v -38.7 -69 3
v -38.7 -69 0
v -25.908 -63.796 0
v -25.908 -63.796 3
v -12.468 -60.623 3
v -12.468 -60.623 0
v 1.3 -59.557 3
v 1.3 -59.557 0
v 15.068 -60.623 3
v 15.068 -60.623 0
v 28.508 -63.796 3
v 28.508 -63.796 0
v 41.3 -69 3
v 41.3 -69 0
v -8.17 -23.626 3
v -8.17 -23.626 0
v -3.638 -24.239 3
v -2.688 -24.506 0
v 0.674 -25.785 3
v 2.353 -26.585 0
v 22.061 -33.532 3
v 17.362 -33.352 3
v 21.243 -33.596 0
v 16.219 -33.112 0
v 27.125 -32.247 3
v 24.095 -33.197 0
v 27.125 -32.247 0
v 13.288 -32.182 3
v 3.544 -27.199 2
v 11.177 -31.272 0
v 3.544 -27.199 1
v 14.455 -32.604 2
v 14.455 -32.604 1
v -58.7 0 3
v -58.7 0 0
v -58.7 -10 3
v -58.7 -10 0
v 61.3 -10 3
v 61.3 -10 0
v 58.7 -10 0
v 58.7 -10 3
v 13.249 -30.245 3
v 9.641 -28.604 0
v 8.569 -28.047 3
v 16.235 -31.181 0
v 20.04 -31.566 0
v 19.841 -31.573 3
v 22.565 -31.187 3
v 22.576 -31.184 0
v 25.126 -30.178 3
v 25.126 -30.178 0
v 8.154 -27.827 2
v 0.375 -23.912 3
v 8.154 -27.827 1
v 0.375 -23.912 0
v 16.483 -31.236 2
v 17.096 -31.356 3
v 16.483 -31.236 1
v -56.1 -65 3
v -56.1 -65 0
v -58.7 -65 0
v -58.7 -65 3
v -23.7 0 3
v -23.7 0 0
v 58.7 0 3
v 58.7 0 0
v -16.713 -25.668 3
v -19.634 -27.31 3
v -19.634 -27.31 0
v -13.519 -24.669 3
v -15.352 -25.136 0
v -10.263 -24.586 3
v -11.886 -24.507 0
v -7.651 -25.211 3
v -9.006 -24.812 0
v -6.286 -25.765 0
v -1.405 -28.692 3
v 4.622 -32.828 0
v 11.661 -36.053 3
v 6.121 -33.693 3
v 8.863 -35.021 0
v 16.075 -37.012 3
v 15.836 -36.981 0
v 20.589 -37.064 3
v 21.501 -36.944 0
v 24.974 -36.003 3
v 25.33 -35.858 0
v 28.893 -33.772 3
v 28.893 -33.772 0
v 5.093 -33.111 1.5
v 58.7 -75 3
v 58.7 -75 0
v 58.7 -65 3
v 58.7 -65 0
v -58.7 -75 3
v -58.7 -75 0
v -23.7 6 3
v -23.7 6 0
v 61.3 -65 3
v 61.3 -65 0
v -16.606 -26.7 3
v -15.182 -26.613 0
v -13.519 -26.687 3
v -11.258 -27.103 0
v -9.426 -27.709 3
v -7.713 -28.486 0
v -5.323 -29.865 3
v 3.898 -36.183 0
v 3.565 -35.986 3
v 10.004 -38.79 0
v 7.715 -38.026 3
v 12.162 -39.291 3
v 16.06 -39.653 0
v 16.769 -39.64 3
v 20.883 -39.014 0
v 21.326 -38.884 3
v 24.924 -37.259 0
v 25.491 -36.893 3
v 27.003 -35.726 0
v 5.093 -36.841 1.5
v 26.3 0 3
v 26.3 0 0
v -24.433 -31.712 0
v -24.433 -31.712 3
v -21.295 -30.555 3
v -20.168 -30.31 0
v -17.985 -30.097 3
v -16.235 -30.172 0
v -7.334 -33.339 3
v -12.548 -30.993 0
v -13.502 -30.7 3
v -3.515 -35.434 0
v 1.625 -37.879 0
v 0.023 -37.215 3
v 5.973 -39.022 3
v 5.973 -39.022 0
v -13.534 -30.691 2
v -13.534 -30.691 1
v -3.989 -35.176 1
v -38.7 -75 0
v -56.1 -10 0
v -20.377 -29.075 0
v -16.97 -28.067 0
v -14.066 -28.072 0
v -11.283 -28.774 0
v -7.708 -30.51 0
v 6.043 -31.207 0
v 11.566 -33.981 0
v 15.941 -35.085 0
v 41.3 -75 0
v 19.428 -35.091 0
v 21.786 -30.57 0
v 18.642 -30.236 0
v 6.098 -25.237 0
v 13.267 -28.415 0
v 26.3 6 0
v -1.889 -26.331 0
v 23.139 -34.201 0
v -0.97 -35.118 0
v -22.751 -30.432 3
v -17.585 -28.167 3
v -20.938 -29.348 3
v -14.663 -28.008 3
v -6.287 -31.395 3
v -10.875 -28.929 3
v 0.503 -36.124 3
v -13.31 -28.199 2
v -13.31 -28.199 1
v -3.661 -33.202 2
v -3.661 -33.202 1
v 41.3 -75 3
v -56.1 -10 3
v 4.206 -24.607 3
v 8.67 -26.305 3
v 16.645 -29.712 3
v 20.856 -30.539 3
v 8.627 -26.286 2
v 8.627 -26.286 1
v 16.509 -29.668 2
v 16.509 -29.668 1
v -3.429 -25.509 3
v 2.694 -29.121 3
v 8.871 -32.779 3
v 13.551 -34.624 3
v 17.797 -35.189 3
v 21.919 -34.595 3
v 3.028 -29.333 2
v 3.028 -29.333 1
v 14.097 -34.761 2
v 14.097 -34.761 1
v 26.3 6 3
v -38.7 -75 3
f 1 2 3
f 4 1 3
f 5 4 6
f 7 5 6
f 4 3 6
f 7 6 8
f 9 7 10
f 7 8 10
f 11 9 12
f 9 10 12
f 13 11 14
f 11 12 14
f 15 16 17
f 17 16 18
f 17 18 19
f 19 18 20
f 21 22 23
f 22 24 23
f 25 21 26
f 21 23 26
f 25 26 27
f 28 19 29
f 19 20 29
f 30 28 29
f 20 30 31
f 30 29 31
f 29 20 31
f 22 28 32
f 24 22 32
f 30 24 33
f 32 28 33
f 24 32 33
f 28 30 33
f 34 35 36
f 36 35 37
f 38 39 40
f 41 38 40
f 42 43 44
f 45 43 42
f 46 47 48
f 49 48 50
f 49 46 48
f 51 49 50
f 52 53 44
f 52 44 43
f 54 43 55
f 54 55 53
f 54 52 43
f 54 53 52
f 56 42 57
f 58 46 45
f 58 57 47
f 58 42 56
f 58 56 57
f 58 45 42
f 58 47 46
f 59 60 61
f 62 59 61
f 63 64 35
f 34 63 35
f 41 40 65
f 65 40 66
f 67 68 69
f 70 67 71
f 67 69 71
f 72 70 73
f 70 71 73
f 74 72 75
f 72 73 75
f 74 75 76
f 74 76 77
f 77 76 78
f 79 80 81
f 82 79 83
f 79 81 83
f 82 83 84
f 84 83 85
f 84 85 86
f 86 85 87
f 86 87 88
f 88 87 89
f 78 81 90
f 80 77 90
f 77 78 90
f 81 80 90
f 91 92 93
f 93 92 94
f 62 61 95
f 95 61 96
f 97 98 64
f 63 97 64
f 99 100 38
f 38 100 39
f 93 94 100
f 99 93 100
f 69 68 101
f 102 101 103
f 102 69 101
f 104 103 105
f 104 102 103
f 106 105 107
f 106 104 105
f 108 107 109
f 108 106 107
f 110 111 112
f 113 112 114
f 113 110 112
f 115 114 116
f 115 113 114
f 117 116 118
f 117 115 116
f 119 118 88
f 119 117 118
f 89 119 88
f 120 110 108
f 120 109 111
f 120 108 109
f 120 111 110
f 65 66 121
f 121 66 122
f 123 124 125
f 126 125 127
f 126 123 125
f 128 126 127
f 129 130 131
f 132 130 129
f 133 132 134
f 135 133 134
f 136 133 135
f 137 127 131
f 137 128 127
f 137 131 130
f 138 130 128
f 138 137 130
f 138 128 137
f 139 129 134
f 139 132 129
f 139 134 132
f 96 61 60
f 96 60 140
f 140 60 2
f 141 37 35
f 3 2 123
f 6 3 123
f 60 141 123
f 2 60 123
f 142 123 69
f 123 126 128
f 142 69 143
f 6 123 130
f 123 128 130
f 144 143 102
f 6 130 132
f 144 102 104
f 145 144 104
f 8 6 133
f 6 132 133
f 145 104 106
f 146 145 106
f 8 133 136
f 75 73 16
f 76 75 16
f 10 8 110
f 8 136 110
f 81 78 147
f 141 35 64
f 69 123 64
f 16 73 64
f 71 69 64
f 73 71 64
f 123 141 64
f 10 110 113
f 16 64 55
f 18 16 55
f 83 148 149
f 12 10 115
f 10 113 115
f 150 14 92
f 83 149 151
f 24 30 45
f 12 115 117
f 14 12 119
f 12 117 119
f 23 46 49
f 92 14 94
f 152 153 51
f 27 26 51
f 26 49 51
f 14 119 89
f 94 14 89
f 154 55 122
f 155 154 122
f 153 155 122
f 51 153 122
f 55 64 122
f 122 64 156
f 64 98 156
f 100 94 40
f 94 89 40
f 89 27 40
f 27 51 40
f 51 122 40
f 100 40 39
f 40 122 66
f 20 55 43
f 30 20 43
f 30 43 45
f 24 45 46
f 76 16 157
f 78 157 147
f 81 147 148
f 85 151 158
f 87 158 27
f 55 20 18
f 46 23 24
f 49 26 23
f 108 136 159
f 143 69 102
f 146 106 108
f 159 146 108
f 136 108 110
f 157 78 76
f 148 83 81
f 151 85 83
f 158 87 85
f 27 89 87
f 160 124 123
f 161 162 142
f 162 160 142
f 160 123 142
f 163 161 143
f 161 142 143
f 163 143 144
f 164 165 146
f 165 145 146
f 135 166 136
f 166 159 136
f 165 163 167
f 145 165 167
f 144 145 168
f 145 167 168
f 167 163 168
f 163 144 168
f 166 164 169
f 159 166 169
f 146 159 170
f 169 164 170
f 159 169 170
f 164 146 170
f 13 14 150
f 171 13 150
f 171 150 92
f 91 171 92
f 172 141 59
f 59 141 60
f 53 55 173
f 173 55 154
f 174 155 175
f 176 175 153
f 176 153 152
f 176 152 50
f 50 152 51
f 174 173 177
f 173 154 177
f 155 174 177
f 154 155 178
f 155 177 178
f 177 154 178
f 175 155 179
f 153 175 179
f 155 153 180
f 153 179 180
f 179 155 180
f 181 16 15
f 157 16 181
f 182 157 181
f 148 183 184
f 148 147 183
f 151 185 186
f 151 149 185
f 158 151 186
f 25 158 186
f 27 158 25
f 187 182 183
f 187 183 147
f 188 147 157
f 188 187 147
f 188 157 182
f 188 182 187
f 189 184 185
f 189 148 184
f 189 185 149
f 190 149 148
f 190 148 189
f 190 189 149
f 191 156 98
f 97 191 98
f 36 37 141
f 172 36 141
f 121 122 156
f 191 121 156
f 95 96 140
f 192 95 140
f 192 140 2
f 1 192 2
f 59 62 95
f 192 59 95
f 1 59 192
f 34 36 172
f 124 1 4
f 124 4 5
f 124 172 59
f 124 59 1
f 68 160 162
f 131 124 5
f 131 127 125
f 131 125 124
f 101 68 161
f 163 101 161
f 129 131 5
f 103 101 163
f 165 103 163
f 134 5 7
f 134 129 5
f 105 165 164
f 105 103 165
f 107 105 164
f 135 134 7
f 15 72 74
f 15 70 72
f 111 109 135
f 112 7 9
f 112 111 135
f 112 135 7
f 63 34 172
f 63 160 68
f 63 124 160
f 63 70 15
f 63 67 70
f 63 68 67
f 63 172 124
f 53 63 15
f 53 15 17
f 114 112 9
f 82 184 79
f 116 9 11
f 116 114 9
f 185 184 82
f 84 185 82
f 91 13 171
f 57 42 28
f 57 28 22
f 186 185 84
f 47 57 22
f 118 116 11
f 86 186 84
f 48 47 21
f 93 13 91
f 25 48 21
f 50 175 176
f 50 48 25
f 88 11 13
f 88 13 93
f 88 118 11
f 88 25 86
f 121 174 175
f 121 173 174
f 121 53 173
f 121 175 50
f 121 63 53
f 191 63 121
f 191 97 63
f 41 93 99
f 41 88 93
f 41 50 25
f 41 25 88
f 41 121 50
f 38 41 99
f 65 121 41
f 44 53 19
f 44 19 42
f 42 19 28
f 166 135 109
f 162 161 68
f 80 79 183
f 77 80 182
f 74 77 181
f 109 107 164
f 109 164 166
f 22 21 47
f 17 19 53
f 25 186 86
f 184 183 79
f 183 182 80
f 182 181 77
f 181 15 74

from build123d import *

# Parameters (mm, degrees)
BOSS_EXTRUDE1_DEPTH = 3
CUT_EXTRUDE1_DEPTH  = 4
CUT_EXTRUDE3_DEPTH  = 4.0000001


with BuildPart() as part:
    # Sketch1 → Boss-Extrude1 (new body)
    with BuildSketch(Plane.XY):
        Polygon((-58.7, -75), (-38.7, -75), (-38.7, -69), (41.3, -69), (41.3, -75), (58.7, -75), (58.7, -65), (61.3, -65), (61.3, -10), (58.7, -10), (58.7, 0), (26.3, 0), (26.3, 6), (-23.7, 6), (-23.7, 0), (-58.7, 0), (-58.7, -10), (-56.1, -10), (-56.1, -65), (-58.7, -65), align=None)
    extrude(amount=BOSS_EXTRUDE1_DEPTH)

    # Sketch2 → Cut-Extrude1 (cut, through all)
    with BuildSketch(Plane(origin=(0, 0, 0), x_dir=(-1, 0, 0), z_dir=(0, 0, -1))):
        with BuildLine():
            add(Edge.make_bspline(
                [(24.433398527, -31.711635794), (12.086875589, -21.375223364), (4.140193098, -35.358229775), (-5.972759652, -39.022471709)],
                knots=[0, 0, 0, 0, 1, 1, 1, 1], degree=3))
            add(Edge.make_bspline(
                [(24.433398527, -31.711635794), (12.266801911, -25.891579846), (4.786651273, -37.542126637), (-5.972759652, -39.022471709)],
                knots=[0, 0, 0, 0, 1, 1, 1, 1], degree=3))
        make_face()
        with BuildLine():
            add(Edge.make_bspline(
                [(19.633876366, -27.309577158), (8.736929361, -24.137857676), (-2.141100893, -40.478091734), (-22.792881591, -41.192187033), (-28.893422578, -33.772468692)],
                knots=[0, 0, 0, 0, 0.516039473, 1, 1, 1, 1], degree=3))
            add(Edge.make_bspline(
                [(19.633876366, -27.309577158), (9.023428577, -20.186786928), (-2.404229512, -35.749210026), (-21.92167278, -39.158153915), (-28.893422578, -33.772468692)],
                knots=[0, 0, 0, 0, 0.521405392, 1, 1, 1, 1], degree=3))
        make_face()
        with BuildLine():
            add(Edge.make_bspline(
                [(8.169819804, -23.626017478), (-3.788465932, -26.918738654), (-12.420801252, -41.286617905), (-27.125100941, -32.24653048)],
                knots=[0, 0, 0, 0, 1, 1, 1, 1], degree=3))
            add(Edge.make_bspline(
                [(8.169819804, -23.626017478), (-4.800169657, -23.753336514), (-12.720211609, -38.015113151), (-27.125100941, -32.24653048)],
                knots=[0, 0, 0, 0, 1, 1, 1, 1], degree=3))
        make_face()
        with BuildLine():
            add(Edge.make_bspline(
                [(-0.374797507, -23.912294014), (-7.802045912, -26.759848505), (-16.403312917, -34.789264508), (-25.125919349, -30.178411592)],
                knots=[0, 0, 0, 0, 1, 1, 1, 1], degree=3))
            add(Edge.make_bspline(
                [(-0.374797507, -23.912294014), (-9.180167192, -24.486819088), (-15.773948384, -32.398766596), (-25.125919349, -30.178411592)],
                knots=[0, 0, 0, 0, 1, 1, 1, 1], degree=3))
        make_face()
    extrude(amount=-CUT_EXTRUDE1_DEPTH, mode=Mode.SUBTRACT)

    # Sketch4 → Cut-Extrude3 (cut, through all)
    with BuildSketch(Plane(origin=(0, 0, 0), x_dir=(-1, 0, 0), z_dir=(0, 0, -1))):
        with BuildLine():
            Line((-41.3, -69), (38.7, -69))
            ThreePointArc((38.7, -69), (-1.3, -59.5572809), (-41.3, -69))
        make_face()
    extrude(amount=-CUT_EXTRUDE3_DEPTH, mode=Mode.SUBTRACT)


solid = part.part
